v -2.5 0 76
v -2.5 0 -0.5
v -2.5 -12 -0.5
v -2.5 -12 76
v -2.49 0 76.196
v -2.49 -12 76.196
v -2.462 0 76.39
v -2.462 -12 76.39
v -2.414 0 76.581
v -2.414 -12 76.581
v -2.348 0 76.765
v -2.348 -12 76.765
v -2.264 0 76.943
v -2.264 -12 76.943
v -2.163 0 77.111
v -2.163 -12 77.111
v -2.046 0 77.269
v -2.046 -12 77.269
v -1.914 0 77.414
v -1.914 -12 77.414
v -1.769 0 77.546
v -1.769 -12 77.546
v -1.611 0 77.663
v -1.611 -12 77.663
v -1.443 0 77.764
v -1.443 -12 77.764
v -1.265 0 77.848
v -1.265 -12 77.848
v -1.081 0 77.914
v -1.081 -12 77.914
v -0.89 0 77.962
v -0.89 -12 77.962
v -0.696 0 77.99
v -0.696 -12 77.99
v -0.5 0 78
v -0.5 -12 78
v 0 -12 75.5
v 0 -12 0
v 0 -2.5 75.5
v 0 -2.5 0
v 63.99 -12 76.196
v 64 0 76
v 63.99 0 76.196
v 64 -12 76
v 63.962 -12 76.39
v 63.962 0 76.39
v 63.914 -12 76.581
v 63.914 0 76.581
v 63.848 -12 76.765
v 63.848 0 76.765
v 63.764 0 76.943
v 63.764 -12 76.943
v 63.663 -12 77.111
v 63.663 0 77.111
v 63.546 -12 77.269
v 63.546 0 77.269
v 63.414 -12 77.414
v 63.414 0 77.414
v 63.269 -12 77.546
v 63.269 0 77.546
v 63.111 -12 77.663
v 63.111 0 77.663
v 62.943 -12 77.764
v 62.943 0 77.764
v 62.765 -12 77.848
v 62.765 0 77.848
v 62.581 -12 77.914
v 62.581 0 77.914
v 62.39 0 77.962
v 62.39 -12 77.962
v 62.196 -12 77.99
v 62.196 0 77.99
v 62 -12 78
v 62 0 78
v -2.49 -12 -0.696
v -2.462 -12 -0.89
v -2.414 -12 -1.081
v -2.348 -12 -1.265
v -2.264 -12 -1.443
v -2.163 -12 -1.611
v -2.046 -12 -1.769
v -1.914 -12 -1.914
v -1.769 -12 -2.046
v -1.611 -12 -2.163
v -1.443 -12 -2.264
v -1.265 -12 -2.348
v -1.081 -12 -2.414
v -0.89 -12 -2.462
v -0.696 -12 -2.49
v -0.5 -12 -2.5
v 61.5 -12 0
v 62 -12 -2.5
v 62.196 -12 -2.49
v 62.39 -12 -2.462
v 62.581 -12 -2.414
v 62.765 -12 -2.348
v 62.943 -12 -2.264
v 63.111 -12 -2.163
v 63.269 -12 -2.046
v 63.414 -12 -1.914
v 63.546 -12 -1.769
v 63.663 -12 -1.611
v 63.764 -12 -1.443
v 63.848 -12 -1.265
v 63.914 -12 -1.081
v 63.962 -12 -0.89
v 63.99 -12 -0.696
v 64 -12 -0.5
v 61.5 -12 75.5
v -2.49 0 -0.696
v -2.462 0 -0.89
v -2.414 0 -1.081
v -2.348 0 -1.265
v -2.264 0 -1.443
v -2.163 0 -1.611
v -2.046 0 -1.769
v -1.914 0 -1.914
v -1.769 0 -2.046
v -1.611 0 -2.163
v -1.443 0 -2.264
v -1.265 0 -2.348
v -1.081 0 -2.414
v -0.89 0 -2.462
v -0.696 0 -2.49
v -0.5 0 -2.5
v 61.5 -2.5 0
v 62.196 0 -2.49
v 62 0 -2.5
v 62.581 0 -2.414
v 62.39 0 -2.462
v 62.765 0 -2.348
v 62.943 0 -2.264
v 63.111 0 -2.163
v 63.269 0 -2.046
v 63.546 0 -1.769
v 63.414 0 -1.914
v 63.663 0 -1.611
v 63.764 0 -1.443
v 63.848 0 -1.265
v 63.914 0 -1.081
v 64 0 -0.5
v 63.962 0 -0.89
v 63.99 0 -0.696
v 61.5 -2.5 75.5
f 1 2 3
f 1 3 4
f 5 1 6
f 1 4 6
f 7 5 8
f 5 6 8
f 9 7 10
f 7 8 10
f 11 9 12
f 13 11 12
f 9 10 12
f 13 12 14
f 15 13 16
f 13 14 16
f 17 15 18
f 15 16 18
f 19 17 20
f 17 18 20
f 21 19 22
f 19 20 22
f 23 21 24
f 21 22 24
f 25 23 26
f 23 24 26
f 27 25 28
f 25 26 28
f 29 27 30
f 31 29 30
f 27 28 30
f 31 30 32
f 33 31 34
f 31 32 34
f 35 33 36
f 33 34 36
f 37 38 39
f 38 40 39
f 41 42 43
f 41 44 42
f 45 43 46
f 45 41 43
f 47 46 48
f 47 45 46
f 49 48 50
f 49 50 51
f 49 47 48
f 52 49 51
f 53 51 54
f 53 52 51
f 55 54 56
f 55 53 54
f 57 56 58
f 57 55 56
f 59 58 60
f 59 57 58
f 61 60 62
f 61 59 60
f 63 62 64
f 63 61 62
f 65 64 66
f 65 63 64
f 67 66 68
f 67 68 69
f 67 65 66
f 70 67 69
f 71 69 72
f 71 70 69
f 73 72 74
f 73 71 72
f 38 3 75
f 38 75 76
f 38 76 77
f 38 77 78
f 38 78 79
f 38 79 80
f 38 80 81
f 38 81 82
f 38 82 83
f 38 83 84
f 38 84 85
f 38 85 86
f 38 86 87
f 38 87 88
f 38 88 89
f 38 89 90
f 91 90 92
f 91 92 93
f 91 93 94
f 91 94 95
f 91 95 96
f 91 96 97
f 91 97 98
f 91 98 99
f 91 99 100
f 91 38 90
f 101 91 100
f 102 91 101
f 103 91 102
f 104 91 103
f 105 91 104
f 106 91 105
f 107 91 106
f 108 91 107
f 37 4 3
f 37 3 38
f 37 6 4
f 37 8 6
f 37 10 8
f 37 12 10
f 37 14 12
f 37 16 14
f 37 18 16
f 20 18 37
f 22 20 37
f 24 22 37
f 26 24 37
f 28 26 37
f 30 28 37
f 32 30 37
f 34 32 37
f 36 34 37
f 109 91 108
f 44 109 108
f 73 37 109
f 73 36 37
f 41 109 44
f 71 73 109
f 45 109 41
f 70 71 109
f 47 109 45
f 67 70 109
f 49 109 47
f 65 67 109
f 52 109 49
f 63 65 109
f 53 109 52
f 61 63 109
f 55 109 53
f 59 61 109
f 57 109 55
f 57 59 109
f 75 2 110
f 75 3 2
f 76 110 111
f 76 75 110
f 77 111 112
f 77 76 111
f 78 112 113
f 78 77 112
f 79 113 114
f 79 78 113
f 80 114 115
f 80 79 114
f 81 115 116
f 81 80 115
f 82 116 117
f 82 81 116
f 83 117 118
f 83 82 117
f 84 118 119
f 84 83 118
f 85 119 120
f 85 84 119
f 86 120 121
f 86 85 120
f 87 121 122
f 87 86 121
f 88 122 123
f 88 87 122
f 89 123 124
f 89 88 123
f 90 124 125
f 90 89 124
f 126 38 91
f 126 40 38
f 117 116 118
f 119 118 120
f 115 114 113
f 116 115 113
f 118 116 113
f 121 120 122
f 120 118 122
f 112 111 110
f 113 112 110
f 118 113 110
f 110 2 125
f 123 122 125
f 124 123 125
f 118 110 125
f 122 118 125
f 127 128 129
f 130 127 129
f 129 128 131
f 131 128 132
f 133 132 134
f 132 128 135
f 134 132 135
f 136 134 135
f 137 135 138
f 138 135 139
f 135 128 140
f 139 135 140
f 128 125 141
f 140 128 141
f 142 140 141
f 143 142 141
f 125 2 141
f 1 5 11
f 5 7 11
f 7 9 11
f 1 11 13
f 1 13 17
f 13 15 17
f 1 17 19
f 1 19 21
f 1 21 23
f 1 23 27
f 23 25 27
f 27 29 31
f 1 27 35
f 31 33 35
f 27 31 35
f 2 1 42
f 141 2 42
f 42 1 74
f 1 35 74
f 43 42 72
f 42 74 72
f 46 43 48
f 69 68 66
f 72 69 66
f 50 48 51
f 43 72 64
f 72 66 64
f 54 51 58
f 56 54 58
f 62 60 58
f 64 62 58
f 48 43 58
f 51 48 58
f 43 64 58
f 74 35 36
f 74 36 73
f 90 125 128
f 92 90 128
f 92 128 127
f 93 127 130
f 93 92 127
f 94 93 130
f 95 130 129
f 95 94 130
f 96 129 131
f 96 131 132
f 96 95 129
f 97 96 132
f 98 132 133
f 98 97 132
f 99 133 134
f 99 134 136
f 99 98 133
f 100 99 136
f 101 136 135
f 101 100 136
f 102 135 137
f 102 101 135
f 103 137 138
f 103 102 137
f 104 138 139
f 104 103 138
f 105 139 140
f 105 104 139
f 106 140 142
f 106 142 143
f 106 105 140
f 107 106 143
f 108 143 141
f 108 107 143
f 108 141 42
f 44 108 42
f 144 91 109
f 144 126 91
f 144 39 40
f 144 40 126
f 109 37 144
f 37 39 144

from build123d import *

# Parameters (mm, degrees)
F0_W     = 66.5
F0_H     = 80.5
F1_DEPTH = 12
F2_T     = -2.5
F3_R     = 2


with BuildPart() as f1:
    # F0 (on Front) → F1 (new body)
    with BuildSketch(Plane.XZ):
        with Locations((30.75, 37.75)):
            Rectangle(F0_W, F0_H)
    extrude(amount=F1_DEPTH)

    # F2
    f2_openings = [f1.faces().sort_by_distance(p)[0] for p in [
        (30.75, -12, 37.75),
    ]]
    offset(amount=F2_T, openings=f2_openings)

    # F3
    f3_edges = [f1.edges().sort_by_distance(p)[0] for p in [
        (64, -6, 78),
        (-2.5, -6, 78),
        (64, -6, -2.5),
        (-2.5, -6, -2.5),
    ]]
    fillet(f3_edges, radius=F3_R)


solid = f1.part
